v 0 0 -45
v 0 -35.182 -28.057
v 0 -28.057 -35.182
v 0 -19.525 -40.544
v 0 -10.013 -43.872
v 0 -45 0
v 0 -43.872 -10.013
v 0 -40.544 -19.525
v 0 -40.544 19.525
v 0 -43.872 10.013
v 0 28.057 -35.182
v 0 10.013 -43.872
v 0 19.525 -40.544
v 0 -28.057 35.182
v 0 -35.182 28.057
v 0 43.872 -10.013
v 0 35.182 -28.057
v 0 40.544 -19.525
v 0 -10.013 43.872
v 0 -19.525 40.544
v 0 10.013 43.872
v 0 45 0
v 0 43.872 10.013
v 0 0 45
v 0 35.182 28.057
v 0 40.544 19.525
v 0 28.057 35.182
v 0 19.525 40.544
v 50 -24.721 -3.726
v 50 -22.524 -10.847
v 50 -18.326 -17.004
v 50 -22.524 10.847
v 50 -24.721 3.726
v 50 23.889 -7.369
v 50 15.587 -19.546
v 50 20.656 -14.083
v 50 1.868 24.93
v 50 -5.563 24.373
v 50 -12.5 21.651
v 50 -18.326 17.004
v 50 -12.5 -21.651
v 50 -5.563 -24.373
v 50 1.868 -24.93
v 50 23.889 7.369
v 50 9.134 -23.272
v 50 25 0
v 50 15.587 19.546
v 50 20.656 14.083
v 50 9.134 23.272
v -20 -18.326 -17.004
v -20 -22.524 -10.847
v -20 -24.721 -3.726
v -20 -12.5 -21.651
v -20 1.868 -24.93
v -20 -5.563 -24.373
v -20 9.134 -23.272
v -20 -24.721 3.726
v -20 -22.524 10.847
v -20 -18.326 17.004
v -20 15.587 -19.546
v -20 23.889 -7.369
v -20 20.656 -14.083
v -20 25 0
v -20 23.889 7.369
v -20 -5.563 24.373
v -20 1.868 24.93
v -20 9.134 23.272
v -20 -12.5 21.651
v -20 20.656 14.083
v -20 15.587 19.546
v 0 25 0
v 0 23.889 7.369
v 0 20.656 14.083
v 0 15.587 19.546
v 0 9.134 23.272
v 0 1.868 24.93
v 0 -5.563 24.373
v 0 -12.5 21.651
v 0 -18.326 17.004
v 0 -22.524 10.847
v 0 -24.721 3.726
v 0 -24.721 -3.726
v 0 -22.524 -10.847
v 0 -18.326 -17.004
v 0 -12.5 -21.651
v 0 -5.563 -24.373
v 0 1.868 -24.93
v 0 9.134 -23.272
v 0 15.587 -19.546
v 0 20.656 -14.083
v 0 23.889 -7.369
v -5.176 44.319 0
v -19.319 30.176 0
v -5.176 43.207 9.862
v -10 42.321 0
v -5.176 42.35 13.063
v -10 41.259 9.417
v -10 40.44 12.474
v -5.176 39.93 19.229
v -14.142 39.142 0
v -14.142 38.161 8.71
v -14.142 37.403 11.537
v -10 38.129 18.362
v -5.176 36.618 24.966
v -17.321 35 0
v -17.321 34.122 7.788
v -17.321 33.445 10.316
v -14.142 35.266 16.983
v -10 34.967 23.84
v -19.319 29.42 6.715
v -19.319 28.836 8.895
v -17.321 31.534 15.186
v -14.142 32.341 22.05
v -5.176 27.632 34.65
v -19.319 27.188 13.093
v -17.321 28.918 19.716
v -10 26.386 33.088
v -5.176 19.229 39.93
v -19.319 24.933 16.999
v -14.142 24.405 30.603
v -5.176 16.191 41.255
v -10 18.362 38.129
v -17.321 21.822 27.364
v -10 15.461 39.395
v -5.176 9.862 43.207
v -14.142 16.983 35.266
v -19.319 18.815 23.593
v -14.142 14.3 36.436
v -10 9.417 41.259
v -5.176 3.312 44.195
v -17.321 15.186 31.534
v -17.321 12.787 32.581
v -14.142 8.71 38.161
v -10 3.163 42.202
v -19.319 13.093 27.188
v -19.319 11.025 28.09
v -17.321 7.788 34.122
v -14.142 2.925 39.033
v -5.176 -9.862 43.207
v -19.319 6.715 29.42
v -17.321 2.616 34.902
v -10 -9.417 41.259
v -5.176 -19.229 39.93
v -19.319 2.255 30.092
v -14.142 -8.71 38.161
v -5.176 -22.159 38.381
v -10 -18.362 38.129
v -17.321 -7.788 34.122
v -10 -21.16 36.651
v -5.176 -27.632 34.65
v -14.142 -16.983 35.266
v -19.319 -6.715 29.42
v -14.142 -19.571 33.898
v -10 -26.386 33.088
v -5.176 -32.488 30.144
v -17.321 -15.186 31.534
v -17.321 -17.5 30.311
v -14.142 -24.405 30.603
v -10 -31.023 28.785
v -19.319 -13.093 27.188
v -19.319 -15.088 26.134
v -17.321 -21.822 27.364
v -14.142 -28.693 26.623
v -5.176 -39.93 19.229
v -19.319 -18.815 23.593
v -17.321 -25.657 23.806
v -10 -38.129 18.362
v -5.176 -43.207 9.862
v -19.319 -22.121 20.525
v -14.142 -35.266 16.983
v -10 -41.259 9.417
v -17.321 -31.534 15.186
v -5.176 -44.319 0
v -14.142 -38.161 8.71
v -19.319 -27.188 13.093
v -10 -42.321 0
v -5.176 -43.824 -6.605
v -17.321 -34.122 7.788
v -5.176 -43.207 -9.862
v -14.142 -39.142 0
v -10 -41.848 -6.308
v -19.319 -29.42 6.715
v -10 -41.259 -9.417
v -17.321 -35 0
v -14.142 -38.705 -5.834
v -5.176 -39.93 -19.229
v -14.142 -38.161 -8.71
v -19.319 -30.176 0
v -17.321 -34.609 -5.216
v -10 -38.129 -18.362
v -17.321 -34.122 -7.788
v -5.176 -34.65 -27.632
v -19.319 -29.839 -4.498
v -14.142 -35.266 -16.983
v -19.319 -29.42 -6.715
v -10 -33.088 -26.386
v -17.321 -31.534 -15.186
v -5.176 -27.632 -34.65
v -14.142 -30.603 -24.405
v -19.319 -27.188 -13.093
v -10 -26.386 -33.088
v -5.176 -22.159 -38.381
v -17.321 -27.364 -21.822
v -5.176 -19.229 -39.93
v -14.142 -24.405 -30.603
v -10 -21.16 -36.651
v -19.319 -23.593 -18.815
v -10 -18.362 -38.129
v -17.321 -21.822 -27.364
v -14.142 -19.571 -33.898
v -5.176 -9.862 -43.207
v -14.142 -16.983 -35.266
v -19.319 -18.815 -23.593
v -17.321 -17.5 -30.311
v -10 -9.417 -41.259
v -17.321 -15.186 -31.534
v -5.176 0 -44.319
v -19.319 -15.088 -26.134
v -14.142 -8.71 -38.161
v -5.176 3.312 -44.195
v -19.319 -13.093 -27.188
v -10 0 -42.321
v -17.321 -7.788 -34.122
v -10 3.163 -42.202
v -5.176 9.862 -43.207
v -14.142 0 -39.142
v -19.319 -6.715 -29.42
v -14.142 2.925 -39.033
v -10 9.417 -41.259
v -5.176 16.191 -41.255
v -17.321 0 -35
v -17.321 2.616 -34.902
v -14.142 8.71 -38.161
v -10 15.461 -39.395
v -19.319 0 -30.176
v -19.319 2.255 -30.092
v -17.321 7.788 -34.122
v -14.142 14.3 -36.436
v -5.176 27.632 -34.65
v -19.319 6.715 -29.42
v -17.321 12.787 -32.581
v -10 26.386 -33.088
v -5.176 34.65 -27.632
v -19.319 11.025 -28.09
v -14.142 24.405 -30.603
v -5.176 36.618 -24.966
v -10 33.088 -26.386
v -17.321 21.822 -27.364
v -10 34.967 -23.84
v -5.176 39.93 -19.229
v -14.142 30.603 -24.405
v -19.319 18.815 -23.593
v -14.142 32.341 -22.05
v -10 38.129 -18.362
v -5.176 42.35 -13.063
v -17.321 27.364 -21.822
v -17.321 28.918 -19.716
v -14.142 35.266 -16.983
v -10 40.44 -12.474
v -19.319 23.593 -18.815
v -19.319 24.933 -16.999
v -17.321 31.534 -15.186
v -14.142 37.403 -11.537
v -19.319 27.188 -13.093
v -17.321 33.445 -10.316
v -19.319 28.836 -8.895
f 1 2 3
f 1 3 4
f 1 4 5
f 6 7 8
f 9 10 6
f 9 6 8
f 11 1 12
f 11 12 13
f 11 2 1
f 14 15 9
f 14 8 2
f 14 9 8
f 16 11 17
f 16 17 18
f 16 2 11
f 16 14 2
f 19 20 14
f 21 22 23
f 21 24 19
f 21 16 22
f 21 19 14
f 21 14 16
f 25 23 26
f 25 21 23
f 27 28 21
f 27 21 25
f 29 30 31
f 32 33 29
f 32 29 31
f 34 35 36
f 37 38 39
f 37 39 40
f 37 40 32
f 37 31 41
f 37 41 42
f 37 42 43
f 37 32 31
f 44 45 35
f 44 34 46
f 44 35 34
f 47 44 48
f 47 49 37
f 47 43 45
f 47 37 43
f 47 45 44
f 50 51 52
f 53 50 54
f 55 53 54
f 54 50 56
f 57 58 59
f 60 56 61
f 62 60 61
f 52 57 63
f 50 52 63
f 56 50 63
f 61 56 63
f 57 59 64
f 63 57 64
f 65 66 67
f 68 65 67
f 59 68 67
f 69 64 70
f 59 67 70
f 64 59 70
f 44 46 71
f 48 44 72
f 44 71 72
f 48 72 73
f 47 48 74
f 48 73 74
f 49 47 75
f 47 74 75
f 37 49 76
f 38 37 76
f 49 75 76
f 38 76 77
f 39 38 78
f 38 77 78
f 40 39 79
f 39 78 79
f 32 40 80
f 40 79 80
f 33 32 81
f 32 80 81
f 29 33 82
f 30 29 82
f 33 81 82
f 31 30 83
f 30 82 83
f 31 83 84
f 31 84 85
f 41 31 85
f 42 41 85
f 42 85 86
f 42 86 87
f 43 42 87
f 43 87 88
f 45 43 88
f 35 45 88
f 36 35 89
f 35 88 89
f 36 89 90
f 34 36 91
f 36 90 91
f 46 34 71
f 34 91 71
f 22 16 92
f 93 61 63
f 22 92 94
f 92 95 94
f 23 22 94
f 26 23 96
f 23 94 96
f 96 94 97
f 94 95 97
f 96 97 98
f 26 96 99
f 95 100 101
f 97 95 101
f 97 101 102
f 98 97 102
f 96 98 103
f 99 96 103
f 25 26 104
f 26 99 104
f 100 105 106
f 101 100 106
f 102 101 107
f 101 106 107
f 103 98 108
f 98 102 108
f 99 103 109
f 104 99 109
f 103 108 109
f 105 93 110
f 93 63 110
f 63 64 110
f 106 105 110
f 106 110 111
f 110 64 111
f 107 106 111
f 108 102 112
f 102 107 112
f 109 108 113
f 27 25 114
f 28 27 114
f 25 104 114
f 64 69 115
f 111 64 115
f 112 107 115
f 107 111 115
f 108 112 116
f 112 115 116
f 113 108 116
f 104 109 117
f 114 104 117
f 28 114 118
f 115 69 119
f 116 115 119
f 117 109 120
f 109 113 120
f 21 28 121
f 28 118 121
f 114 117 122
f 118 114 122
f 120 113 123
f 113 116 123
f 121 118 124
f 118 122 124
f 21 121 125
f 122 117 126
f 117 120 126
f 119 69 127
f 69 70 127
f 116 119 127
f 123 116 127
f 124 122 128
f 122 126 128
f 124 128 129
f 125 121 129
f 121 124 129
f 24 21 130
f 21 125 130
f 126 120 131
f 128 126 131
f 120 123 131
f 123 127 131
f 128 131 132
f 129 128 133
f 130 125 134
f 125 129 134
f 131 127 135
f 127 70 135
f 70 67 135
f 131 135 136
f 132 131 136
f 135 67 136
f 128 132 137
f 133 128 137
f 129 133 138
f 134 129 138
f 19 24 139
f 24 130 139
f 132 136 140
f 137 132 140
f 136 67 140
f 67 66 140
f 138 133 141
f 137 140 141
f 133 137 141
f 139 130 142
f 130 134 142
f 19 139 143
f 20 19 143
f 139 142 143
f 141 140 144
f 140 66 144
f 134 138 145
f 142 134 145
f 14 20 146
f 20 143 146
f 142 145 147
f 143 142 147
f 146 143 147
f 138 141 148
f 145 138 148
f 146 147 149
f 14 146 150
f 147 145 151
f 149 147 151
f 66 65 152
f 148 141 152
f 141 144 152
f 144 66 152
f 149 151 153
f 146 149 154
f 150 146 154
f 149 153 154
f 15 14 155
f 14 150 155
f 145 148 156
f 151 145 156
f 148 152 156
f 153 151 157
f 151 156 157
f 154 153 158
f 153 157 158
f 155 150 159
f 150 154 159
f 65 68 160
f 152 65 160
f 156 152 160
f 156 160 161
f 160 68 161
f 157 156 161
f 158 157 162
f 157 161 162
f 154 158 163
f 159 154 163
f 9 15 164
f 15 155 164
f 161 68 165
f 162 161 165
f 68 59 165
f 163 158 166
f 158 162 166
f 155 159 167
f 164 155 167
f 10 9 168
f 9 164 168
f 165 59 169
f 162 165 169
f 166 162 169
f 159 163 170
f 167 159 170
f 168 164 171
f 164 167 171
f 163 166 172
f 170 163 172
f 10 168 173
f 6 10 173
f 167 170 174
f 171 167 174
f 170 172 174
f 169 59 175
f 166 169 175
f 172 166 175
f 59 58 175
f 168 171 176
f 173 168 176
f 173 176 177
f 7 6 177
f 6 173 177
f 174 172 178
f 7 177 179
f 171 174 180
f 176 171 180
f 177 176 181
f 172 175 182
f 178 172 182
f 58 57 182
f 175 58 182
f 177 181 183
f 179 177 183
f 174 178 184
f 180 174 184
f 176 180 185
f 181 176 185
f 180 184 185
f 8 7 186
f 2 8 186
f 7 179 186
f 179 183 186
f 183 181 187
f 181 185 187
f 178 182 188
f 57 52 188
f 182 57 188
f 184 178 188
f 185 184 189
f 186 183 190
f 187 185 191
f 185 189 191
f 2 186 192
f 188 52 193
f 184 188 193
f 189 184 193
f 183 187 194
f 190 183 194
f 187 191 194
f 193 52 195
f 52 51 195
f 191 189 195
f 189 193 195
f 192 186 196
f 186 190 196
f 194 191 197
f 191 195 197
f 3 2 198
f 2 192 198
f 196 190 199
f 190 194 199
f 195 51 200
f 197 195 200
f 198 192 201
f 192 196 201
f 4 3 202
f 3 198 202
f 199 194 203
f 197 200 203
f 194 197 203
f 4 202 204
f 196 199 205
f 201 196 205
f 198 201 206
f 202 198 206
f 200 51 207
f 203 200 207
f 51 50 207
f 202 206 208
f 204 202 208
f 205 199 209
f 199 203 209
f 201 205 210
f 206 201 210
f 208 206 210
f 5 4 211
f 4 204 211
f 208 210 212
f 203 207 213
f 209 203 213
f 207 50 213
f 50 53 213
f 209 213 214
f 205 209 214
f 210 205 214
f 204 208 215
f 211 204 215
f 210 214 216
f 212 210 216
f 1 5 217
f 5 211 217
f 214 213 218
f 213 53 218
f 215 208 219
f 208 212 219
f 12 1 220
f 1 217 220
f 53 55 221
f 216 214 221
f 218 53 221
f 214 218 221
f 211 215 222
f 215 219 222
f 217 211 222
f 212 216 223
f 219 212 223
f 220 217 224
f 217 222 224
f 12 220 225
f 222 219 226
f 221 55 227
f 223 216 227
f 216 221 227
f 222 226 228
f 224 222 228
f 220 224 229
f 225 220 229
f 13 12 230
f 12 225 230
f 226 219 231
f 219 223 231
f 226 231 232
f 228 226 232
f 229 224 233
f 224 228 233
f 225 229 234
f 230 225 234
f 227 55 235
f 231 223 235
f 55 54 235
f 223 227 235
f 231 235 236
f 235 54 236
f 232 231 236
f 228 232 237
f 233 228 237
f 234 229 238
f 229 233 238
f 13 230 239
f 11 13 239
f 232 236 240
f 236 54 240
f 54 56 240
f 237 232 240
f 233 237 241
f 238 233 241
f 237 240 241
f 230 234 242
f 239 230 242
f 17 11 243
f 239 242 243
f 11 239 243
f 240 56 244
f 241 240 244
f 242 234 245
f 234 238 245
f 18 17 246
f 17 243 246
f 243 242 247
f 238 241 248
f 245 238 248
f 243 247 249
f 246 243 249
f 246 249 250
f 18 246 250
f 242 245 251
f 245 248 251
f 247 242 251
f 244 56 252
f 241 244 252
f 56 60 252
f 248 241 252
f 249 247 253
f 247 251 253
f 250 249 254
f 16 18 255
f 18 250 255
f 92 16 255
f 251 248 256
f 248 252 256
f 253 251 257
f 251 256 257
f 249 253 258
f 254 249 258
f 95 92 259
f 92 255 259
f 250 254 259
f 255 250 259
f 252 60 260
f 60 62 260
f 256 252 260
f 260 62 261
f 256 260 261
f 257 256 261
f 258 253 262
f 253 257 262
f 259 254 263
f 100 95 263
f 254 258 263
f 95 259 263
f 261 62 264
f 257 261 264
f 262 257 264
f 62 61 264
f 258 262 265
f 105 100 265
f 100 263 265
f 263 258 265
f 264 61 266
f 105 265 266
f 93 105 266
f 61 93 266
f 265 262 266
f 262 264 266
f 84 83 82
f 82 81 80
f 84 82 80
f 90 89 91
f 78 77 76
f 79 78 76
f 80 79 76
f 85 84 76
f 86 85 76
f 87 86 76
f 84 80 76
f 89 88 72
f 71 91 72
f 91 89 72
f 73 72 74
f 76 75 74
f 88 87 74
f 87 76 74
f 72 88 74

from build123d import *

# Parameters (mm, degrees)
F0_R     = 25
F1_DEPTH = 50
F0_R_2   = 45
F2_DEPTH = 20
F3_R     = 19.99999


# Not quite as in the source:
# - a fillet or chamfer is up to 0.001 mm smaller than in the source, because OpenCascade refuses the exact size


with BuildPart() as f1:
    # F0 (on Right) → F1 (new body)
    with BuildSketch(Plane.YZ):
        Circle(F0_R)
    extrude(amount=F1_DEPTH)


with BuildPart() as f2:
    # F0 (on Right) → F2 (new body)
    with BuildSketch(Plane.YZ):
        Circle(F0_R_2)
        Circle(F0_R, mode=Mode.SUBTRACT)
        Circle(F0_R)
    extrude(amount=-F2_DEPTH)

    # F3 (radius 20 in the source; OpenCascade refuses exactly that, so slightly less here)
    f3_edges = [f2.edges().sort_by_distance(p)[0] for p in [
        (-20, -45, 0),
    ]]
    fillet(f3_edges, radius=F3_R)


solid = Compound([f1.part, f2.part])
